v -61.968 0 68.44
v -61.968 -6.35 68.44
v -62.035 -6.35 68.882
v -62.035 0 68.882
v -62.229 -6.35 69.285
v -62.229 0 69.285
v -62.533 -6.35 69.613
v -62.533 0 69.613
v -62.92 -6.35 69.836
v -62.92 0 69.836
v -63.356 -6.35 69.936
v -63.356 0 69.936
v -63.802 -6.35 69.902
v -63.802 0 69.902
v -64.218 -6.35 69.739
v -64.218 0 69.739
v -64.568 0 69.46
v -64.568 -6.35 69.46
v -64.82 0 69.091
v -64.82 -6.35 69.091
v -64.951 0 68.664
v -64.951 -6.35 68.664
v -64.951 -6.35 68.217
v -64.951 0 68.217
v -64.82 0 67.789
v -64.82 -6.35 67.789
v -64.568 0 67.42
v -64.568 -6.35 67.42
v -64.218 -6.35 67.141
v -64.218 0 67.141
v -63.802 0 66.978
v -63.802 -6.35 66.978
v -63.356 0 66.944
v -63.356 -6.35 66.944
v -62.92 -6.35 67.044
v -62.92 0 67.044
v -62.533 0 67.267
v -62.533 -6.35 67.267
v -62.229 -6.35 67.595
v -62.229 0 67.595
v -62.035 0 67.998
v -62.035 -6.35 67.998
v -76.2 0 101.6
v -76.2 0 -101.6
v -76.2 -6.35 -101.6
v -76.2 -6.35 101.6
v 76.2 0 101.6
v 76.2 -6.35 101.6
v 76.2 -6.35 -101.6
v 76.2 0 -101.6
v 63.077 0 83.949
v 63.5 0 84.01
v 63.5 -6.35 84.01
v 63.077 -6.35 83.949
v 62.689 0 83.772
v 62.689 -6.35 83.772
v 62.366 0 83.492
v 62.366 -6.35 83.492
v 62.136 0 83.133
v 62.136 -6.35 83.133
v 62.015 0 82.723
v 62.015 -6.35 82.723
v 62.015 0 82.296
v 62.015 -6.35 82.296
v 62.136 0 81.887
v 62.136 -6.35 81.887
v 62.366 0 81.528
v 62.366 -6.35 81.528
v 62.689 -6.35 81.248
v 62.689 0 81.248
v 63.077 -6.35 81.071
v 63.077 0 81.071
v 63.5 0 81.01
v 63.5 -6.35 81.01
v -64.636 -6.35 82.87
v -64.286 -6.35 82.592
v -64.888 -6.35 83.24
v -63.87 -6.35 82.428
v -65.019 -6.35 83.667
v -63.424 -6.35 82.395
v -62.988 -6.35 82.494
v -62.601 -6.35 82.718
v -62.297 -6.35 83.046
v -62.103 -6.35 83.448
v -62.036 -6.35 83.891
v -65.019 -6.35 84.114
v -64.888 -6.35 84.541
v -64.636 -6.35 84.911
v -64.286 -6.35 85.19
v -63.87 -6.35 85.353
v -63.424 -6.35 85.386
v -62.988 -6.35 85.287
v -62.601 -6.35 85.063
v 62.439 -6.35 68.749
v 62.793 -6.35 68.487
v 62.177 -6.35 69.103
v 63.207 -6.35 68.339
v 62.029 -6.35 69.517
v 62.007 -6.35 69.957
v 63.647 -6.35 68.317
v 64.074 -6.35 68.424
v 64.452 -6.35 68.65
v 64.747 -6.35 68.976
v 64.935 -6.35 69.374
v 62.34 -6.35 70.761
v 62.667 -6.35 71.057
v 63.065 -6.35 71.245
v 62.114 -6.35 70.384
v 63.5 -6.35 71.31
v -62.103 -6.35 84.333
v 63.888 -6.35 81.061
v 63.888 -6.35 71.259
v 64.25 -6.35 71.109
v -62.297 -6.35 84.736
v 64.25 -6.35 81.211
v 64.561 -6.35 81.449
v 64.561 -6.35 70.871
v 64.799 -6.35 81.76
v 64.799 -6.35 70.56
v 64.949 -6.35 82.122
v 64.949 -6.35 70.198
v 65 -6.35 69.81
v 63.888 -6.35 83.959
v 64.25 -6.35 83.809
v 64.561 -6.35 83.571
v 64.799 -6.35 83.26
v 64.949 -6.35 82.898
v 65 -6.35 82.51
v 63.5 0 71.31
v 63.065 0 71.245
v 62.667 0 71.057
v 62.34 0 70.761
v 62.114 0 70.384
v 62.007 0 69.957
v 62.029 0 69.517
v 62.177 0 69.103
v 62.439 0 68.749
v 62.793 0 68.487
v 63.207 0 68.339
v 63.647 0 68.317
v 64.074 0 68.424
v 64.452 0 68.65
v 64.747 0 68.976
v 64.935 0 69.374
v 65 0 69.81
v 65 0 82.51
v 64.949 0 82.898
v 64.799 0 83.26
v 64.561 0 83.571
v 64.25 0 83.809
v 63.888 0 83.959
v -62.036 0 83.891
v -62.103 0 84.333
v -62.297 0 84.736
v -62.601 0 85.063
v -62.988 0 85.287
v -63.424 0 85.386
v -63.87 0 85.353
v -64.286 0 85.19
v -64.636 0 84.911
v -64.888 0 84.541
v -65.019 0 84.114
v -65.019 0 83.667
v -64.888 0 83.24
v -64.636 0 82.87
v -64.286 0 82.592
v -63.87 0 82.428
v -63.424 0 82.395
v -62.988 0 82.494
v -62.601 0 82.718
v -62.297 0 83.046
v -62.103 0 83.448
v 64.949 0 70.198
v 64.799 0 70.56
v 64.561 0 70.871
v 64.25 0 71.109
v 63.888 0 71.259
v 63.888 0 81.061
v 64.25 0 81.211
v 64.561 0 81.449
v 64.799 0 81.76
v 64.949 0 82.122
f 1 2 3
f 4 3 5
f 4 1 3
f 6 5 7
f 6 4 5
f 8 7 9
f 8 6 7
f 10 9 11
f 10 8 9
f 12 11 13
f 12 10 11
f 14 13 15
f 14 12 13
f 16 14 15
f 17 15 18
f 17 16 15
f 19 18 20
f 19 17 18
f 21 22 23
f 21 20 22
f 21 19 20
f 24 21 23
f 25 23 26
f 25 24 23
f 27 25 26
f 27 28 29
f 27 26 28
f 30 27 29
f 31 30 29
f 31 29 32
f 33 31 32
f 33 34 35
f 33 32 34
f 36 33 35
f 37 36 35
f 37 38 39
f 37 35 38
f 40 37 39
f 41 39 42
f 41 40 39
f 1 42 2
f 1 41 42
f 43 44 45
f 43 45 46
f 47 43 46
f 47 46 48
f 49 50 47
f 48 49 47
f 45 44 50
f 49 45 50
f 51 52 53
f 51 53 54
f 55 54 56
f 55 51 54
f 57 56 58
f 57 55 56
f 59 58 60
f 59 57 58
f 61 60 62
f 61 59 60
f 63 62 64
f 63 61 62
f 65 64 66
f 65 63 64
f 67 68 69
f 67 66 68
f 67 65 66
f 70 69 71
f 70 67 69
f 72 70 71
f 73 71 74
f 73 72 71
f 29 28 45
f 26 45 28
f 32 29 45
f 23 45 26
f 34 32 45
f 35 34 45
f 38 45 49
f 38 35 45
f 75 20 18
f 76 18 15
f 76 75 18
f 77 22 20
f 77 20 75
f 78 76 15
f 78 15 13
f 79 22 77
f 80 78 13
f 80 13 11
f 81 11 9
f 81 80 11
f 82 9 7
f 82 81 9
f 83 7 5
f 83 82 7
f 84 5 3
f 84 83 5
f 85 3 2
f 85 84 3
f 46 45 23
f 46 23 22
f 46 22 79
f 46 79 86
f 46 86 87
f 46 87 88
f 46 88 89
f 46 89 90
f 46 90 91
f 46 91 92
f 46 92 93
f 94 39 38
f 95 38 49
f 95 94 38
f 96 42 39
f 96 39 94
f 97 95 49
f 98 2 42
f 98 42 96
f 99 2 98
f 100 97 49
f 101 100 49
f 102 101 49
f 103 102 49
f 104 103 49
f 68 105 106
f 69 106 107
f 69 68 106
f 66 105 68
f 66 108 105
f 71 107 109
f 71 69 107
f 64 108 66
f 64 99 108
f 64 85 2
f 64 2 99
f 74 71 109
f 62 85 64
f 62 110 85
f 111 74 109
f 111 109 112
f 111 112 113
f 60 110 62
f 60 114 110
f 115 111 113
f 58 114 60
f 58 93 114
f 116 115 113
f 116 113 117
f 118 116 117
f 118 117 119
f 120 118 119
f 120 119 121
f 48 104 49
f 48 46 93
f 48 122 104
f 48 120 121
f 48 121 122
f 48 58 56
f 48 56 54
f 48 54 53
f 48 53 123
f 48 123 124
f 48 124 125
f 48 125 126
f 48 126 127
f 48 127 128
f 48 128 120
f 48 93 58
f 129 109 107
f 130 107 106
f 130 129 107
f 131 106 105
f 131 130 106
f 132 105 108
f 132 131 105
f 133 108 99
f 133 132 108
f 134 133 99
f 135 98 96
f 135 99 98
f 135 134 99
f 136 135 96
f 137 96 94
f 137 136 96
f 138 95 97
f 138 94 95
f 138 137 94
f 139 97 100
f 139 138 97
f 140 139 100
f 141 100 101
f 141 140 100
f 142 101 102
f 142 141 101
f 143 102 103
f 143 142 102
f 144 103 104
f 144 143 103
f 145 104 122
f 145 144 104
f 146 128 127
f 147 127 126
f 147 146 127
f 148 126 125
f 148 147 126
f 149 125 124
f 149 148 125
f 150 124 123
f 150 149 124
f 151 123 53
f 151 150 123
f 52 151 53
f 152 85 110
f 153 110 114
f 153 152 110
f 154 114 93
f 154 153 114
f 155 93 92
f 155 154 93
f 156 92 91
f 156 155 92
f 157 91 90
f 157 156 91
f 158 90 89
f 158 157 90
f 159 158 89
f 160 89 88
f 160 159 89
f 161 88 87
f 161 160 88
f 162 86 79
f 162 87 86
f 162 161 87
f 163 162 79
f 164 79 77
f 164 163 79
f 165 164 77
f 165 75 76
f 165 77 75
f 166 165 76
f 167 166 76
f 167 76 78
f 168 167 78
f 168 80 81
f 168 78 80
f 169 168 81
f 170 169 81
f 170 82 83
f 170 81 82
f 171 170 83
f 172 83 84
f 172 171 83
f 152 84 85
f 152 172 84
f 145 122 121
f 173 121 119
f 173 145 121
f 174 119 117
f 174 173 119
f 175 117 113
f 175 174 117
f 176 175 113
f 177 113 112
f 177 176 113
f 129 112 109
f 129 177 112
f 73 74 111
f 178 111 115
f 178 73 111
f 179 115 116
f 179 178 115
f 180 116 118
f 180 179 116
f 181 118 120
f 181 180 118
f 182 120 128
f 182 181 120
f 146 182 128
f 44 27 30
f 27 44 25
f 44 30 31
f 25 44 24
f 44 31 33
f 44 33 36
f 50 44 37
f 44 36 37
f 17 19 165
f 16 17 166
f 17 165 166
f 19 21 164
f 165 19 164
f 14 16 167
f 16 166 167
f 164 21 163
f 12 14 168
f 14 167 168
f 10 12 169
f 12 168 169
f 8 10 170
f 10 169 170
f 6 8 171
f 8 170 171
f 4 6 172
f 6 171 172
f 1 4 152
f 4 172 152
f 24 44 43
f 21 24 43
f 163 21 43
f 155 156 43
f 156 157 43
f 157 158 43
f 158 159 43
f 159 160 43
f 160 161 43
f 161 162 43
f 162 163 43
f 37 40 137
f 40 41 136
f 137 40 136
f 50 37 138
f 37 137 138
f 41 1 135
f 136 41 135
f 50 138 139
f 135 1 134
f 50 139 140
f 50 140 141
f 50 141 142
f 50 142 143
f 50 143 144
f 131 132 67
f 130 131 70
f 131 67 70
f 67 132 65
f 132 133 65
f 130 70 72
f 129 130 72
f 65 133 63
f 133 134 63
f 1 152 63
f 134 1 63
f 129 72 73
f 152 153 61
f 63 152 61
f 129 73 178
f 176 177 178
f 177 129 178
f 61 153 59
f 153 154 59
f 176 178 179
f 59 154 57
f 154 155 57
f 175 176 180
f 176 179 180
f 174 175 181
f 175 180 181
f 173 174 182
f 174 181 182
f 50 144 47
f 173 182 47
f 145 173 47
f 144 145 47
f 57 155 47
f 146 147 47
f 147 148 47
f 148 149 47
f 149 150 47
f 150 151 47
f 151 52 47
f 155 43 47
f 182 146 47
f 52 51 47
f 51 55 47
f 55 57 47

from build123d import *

# Parameters (mm, degrees)
F0_W     = 152.4
F0_H     = 203.2
F1_DEPTH = 6.35
F2_R     = 1.5
F4_DEPTH = 14.4018
F5_DEPTH = 25.4


with BuildPart() as f1:
    # F0 (on Front) → F1 (new body)
    with BuildSketch(Plane.XZ):
        Rectangle(F0_W, F0_H)
    extrude(amount=F1_DEPTH)

    # F2 (on Front) → F4 (cut)
    with BuildSketch(Plane.XZ):
        with Locations((-63.536064, 83.890614)):
            Circle(F2_R)
        with Locations((-63.468215, 68.440081)):
            Circle(F2_R)
    extrude(amount=F4_DEPTH, mode=Mode.SUBTRACT)

    # F3 (on Front) → F5 (cut)
    with BuildSketch(Plane.XZ):
        with BuildLine():
            ThreePointArc((65, 82.509852), (64.56066, 83.570512), (63.5, 84.009852))
            Line((63.5, 84.009852), (63.5, 82.509852))
            Line((63.5, 82.509852), (63.5, 81.009852))
            ThreePointArc((63.5, 81.009852), (64.56066, 81.449192), (65, 82.509852))
        make_face()
        with BuildLine():
            ThreePointArc((65, 69.80985), (64.56066, 70.87051), (63.5, 71.30985))
            ThreePointArc((63.5, 71.30985), (62.43934, 68.749189), (65, 69.80985))
        make_face()
        with BuildLine():
            Line((63.5, 82.509852), (63.5, 84.009852))
            ThreePointArc((63.5, 84.009852), (62, 82.509852), (63.5, 81.009852))
            Line((63.5, 81.009852), (63.5, 82.509852))
        make_face()
    extrude(amount=F5_DEPTH, mode=Mode.SUBTRACT)


solid = f1.part
